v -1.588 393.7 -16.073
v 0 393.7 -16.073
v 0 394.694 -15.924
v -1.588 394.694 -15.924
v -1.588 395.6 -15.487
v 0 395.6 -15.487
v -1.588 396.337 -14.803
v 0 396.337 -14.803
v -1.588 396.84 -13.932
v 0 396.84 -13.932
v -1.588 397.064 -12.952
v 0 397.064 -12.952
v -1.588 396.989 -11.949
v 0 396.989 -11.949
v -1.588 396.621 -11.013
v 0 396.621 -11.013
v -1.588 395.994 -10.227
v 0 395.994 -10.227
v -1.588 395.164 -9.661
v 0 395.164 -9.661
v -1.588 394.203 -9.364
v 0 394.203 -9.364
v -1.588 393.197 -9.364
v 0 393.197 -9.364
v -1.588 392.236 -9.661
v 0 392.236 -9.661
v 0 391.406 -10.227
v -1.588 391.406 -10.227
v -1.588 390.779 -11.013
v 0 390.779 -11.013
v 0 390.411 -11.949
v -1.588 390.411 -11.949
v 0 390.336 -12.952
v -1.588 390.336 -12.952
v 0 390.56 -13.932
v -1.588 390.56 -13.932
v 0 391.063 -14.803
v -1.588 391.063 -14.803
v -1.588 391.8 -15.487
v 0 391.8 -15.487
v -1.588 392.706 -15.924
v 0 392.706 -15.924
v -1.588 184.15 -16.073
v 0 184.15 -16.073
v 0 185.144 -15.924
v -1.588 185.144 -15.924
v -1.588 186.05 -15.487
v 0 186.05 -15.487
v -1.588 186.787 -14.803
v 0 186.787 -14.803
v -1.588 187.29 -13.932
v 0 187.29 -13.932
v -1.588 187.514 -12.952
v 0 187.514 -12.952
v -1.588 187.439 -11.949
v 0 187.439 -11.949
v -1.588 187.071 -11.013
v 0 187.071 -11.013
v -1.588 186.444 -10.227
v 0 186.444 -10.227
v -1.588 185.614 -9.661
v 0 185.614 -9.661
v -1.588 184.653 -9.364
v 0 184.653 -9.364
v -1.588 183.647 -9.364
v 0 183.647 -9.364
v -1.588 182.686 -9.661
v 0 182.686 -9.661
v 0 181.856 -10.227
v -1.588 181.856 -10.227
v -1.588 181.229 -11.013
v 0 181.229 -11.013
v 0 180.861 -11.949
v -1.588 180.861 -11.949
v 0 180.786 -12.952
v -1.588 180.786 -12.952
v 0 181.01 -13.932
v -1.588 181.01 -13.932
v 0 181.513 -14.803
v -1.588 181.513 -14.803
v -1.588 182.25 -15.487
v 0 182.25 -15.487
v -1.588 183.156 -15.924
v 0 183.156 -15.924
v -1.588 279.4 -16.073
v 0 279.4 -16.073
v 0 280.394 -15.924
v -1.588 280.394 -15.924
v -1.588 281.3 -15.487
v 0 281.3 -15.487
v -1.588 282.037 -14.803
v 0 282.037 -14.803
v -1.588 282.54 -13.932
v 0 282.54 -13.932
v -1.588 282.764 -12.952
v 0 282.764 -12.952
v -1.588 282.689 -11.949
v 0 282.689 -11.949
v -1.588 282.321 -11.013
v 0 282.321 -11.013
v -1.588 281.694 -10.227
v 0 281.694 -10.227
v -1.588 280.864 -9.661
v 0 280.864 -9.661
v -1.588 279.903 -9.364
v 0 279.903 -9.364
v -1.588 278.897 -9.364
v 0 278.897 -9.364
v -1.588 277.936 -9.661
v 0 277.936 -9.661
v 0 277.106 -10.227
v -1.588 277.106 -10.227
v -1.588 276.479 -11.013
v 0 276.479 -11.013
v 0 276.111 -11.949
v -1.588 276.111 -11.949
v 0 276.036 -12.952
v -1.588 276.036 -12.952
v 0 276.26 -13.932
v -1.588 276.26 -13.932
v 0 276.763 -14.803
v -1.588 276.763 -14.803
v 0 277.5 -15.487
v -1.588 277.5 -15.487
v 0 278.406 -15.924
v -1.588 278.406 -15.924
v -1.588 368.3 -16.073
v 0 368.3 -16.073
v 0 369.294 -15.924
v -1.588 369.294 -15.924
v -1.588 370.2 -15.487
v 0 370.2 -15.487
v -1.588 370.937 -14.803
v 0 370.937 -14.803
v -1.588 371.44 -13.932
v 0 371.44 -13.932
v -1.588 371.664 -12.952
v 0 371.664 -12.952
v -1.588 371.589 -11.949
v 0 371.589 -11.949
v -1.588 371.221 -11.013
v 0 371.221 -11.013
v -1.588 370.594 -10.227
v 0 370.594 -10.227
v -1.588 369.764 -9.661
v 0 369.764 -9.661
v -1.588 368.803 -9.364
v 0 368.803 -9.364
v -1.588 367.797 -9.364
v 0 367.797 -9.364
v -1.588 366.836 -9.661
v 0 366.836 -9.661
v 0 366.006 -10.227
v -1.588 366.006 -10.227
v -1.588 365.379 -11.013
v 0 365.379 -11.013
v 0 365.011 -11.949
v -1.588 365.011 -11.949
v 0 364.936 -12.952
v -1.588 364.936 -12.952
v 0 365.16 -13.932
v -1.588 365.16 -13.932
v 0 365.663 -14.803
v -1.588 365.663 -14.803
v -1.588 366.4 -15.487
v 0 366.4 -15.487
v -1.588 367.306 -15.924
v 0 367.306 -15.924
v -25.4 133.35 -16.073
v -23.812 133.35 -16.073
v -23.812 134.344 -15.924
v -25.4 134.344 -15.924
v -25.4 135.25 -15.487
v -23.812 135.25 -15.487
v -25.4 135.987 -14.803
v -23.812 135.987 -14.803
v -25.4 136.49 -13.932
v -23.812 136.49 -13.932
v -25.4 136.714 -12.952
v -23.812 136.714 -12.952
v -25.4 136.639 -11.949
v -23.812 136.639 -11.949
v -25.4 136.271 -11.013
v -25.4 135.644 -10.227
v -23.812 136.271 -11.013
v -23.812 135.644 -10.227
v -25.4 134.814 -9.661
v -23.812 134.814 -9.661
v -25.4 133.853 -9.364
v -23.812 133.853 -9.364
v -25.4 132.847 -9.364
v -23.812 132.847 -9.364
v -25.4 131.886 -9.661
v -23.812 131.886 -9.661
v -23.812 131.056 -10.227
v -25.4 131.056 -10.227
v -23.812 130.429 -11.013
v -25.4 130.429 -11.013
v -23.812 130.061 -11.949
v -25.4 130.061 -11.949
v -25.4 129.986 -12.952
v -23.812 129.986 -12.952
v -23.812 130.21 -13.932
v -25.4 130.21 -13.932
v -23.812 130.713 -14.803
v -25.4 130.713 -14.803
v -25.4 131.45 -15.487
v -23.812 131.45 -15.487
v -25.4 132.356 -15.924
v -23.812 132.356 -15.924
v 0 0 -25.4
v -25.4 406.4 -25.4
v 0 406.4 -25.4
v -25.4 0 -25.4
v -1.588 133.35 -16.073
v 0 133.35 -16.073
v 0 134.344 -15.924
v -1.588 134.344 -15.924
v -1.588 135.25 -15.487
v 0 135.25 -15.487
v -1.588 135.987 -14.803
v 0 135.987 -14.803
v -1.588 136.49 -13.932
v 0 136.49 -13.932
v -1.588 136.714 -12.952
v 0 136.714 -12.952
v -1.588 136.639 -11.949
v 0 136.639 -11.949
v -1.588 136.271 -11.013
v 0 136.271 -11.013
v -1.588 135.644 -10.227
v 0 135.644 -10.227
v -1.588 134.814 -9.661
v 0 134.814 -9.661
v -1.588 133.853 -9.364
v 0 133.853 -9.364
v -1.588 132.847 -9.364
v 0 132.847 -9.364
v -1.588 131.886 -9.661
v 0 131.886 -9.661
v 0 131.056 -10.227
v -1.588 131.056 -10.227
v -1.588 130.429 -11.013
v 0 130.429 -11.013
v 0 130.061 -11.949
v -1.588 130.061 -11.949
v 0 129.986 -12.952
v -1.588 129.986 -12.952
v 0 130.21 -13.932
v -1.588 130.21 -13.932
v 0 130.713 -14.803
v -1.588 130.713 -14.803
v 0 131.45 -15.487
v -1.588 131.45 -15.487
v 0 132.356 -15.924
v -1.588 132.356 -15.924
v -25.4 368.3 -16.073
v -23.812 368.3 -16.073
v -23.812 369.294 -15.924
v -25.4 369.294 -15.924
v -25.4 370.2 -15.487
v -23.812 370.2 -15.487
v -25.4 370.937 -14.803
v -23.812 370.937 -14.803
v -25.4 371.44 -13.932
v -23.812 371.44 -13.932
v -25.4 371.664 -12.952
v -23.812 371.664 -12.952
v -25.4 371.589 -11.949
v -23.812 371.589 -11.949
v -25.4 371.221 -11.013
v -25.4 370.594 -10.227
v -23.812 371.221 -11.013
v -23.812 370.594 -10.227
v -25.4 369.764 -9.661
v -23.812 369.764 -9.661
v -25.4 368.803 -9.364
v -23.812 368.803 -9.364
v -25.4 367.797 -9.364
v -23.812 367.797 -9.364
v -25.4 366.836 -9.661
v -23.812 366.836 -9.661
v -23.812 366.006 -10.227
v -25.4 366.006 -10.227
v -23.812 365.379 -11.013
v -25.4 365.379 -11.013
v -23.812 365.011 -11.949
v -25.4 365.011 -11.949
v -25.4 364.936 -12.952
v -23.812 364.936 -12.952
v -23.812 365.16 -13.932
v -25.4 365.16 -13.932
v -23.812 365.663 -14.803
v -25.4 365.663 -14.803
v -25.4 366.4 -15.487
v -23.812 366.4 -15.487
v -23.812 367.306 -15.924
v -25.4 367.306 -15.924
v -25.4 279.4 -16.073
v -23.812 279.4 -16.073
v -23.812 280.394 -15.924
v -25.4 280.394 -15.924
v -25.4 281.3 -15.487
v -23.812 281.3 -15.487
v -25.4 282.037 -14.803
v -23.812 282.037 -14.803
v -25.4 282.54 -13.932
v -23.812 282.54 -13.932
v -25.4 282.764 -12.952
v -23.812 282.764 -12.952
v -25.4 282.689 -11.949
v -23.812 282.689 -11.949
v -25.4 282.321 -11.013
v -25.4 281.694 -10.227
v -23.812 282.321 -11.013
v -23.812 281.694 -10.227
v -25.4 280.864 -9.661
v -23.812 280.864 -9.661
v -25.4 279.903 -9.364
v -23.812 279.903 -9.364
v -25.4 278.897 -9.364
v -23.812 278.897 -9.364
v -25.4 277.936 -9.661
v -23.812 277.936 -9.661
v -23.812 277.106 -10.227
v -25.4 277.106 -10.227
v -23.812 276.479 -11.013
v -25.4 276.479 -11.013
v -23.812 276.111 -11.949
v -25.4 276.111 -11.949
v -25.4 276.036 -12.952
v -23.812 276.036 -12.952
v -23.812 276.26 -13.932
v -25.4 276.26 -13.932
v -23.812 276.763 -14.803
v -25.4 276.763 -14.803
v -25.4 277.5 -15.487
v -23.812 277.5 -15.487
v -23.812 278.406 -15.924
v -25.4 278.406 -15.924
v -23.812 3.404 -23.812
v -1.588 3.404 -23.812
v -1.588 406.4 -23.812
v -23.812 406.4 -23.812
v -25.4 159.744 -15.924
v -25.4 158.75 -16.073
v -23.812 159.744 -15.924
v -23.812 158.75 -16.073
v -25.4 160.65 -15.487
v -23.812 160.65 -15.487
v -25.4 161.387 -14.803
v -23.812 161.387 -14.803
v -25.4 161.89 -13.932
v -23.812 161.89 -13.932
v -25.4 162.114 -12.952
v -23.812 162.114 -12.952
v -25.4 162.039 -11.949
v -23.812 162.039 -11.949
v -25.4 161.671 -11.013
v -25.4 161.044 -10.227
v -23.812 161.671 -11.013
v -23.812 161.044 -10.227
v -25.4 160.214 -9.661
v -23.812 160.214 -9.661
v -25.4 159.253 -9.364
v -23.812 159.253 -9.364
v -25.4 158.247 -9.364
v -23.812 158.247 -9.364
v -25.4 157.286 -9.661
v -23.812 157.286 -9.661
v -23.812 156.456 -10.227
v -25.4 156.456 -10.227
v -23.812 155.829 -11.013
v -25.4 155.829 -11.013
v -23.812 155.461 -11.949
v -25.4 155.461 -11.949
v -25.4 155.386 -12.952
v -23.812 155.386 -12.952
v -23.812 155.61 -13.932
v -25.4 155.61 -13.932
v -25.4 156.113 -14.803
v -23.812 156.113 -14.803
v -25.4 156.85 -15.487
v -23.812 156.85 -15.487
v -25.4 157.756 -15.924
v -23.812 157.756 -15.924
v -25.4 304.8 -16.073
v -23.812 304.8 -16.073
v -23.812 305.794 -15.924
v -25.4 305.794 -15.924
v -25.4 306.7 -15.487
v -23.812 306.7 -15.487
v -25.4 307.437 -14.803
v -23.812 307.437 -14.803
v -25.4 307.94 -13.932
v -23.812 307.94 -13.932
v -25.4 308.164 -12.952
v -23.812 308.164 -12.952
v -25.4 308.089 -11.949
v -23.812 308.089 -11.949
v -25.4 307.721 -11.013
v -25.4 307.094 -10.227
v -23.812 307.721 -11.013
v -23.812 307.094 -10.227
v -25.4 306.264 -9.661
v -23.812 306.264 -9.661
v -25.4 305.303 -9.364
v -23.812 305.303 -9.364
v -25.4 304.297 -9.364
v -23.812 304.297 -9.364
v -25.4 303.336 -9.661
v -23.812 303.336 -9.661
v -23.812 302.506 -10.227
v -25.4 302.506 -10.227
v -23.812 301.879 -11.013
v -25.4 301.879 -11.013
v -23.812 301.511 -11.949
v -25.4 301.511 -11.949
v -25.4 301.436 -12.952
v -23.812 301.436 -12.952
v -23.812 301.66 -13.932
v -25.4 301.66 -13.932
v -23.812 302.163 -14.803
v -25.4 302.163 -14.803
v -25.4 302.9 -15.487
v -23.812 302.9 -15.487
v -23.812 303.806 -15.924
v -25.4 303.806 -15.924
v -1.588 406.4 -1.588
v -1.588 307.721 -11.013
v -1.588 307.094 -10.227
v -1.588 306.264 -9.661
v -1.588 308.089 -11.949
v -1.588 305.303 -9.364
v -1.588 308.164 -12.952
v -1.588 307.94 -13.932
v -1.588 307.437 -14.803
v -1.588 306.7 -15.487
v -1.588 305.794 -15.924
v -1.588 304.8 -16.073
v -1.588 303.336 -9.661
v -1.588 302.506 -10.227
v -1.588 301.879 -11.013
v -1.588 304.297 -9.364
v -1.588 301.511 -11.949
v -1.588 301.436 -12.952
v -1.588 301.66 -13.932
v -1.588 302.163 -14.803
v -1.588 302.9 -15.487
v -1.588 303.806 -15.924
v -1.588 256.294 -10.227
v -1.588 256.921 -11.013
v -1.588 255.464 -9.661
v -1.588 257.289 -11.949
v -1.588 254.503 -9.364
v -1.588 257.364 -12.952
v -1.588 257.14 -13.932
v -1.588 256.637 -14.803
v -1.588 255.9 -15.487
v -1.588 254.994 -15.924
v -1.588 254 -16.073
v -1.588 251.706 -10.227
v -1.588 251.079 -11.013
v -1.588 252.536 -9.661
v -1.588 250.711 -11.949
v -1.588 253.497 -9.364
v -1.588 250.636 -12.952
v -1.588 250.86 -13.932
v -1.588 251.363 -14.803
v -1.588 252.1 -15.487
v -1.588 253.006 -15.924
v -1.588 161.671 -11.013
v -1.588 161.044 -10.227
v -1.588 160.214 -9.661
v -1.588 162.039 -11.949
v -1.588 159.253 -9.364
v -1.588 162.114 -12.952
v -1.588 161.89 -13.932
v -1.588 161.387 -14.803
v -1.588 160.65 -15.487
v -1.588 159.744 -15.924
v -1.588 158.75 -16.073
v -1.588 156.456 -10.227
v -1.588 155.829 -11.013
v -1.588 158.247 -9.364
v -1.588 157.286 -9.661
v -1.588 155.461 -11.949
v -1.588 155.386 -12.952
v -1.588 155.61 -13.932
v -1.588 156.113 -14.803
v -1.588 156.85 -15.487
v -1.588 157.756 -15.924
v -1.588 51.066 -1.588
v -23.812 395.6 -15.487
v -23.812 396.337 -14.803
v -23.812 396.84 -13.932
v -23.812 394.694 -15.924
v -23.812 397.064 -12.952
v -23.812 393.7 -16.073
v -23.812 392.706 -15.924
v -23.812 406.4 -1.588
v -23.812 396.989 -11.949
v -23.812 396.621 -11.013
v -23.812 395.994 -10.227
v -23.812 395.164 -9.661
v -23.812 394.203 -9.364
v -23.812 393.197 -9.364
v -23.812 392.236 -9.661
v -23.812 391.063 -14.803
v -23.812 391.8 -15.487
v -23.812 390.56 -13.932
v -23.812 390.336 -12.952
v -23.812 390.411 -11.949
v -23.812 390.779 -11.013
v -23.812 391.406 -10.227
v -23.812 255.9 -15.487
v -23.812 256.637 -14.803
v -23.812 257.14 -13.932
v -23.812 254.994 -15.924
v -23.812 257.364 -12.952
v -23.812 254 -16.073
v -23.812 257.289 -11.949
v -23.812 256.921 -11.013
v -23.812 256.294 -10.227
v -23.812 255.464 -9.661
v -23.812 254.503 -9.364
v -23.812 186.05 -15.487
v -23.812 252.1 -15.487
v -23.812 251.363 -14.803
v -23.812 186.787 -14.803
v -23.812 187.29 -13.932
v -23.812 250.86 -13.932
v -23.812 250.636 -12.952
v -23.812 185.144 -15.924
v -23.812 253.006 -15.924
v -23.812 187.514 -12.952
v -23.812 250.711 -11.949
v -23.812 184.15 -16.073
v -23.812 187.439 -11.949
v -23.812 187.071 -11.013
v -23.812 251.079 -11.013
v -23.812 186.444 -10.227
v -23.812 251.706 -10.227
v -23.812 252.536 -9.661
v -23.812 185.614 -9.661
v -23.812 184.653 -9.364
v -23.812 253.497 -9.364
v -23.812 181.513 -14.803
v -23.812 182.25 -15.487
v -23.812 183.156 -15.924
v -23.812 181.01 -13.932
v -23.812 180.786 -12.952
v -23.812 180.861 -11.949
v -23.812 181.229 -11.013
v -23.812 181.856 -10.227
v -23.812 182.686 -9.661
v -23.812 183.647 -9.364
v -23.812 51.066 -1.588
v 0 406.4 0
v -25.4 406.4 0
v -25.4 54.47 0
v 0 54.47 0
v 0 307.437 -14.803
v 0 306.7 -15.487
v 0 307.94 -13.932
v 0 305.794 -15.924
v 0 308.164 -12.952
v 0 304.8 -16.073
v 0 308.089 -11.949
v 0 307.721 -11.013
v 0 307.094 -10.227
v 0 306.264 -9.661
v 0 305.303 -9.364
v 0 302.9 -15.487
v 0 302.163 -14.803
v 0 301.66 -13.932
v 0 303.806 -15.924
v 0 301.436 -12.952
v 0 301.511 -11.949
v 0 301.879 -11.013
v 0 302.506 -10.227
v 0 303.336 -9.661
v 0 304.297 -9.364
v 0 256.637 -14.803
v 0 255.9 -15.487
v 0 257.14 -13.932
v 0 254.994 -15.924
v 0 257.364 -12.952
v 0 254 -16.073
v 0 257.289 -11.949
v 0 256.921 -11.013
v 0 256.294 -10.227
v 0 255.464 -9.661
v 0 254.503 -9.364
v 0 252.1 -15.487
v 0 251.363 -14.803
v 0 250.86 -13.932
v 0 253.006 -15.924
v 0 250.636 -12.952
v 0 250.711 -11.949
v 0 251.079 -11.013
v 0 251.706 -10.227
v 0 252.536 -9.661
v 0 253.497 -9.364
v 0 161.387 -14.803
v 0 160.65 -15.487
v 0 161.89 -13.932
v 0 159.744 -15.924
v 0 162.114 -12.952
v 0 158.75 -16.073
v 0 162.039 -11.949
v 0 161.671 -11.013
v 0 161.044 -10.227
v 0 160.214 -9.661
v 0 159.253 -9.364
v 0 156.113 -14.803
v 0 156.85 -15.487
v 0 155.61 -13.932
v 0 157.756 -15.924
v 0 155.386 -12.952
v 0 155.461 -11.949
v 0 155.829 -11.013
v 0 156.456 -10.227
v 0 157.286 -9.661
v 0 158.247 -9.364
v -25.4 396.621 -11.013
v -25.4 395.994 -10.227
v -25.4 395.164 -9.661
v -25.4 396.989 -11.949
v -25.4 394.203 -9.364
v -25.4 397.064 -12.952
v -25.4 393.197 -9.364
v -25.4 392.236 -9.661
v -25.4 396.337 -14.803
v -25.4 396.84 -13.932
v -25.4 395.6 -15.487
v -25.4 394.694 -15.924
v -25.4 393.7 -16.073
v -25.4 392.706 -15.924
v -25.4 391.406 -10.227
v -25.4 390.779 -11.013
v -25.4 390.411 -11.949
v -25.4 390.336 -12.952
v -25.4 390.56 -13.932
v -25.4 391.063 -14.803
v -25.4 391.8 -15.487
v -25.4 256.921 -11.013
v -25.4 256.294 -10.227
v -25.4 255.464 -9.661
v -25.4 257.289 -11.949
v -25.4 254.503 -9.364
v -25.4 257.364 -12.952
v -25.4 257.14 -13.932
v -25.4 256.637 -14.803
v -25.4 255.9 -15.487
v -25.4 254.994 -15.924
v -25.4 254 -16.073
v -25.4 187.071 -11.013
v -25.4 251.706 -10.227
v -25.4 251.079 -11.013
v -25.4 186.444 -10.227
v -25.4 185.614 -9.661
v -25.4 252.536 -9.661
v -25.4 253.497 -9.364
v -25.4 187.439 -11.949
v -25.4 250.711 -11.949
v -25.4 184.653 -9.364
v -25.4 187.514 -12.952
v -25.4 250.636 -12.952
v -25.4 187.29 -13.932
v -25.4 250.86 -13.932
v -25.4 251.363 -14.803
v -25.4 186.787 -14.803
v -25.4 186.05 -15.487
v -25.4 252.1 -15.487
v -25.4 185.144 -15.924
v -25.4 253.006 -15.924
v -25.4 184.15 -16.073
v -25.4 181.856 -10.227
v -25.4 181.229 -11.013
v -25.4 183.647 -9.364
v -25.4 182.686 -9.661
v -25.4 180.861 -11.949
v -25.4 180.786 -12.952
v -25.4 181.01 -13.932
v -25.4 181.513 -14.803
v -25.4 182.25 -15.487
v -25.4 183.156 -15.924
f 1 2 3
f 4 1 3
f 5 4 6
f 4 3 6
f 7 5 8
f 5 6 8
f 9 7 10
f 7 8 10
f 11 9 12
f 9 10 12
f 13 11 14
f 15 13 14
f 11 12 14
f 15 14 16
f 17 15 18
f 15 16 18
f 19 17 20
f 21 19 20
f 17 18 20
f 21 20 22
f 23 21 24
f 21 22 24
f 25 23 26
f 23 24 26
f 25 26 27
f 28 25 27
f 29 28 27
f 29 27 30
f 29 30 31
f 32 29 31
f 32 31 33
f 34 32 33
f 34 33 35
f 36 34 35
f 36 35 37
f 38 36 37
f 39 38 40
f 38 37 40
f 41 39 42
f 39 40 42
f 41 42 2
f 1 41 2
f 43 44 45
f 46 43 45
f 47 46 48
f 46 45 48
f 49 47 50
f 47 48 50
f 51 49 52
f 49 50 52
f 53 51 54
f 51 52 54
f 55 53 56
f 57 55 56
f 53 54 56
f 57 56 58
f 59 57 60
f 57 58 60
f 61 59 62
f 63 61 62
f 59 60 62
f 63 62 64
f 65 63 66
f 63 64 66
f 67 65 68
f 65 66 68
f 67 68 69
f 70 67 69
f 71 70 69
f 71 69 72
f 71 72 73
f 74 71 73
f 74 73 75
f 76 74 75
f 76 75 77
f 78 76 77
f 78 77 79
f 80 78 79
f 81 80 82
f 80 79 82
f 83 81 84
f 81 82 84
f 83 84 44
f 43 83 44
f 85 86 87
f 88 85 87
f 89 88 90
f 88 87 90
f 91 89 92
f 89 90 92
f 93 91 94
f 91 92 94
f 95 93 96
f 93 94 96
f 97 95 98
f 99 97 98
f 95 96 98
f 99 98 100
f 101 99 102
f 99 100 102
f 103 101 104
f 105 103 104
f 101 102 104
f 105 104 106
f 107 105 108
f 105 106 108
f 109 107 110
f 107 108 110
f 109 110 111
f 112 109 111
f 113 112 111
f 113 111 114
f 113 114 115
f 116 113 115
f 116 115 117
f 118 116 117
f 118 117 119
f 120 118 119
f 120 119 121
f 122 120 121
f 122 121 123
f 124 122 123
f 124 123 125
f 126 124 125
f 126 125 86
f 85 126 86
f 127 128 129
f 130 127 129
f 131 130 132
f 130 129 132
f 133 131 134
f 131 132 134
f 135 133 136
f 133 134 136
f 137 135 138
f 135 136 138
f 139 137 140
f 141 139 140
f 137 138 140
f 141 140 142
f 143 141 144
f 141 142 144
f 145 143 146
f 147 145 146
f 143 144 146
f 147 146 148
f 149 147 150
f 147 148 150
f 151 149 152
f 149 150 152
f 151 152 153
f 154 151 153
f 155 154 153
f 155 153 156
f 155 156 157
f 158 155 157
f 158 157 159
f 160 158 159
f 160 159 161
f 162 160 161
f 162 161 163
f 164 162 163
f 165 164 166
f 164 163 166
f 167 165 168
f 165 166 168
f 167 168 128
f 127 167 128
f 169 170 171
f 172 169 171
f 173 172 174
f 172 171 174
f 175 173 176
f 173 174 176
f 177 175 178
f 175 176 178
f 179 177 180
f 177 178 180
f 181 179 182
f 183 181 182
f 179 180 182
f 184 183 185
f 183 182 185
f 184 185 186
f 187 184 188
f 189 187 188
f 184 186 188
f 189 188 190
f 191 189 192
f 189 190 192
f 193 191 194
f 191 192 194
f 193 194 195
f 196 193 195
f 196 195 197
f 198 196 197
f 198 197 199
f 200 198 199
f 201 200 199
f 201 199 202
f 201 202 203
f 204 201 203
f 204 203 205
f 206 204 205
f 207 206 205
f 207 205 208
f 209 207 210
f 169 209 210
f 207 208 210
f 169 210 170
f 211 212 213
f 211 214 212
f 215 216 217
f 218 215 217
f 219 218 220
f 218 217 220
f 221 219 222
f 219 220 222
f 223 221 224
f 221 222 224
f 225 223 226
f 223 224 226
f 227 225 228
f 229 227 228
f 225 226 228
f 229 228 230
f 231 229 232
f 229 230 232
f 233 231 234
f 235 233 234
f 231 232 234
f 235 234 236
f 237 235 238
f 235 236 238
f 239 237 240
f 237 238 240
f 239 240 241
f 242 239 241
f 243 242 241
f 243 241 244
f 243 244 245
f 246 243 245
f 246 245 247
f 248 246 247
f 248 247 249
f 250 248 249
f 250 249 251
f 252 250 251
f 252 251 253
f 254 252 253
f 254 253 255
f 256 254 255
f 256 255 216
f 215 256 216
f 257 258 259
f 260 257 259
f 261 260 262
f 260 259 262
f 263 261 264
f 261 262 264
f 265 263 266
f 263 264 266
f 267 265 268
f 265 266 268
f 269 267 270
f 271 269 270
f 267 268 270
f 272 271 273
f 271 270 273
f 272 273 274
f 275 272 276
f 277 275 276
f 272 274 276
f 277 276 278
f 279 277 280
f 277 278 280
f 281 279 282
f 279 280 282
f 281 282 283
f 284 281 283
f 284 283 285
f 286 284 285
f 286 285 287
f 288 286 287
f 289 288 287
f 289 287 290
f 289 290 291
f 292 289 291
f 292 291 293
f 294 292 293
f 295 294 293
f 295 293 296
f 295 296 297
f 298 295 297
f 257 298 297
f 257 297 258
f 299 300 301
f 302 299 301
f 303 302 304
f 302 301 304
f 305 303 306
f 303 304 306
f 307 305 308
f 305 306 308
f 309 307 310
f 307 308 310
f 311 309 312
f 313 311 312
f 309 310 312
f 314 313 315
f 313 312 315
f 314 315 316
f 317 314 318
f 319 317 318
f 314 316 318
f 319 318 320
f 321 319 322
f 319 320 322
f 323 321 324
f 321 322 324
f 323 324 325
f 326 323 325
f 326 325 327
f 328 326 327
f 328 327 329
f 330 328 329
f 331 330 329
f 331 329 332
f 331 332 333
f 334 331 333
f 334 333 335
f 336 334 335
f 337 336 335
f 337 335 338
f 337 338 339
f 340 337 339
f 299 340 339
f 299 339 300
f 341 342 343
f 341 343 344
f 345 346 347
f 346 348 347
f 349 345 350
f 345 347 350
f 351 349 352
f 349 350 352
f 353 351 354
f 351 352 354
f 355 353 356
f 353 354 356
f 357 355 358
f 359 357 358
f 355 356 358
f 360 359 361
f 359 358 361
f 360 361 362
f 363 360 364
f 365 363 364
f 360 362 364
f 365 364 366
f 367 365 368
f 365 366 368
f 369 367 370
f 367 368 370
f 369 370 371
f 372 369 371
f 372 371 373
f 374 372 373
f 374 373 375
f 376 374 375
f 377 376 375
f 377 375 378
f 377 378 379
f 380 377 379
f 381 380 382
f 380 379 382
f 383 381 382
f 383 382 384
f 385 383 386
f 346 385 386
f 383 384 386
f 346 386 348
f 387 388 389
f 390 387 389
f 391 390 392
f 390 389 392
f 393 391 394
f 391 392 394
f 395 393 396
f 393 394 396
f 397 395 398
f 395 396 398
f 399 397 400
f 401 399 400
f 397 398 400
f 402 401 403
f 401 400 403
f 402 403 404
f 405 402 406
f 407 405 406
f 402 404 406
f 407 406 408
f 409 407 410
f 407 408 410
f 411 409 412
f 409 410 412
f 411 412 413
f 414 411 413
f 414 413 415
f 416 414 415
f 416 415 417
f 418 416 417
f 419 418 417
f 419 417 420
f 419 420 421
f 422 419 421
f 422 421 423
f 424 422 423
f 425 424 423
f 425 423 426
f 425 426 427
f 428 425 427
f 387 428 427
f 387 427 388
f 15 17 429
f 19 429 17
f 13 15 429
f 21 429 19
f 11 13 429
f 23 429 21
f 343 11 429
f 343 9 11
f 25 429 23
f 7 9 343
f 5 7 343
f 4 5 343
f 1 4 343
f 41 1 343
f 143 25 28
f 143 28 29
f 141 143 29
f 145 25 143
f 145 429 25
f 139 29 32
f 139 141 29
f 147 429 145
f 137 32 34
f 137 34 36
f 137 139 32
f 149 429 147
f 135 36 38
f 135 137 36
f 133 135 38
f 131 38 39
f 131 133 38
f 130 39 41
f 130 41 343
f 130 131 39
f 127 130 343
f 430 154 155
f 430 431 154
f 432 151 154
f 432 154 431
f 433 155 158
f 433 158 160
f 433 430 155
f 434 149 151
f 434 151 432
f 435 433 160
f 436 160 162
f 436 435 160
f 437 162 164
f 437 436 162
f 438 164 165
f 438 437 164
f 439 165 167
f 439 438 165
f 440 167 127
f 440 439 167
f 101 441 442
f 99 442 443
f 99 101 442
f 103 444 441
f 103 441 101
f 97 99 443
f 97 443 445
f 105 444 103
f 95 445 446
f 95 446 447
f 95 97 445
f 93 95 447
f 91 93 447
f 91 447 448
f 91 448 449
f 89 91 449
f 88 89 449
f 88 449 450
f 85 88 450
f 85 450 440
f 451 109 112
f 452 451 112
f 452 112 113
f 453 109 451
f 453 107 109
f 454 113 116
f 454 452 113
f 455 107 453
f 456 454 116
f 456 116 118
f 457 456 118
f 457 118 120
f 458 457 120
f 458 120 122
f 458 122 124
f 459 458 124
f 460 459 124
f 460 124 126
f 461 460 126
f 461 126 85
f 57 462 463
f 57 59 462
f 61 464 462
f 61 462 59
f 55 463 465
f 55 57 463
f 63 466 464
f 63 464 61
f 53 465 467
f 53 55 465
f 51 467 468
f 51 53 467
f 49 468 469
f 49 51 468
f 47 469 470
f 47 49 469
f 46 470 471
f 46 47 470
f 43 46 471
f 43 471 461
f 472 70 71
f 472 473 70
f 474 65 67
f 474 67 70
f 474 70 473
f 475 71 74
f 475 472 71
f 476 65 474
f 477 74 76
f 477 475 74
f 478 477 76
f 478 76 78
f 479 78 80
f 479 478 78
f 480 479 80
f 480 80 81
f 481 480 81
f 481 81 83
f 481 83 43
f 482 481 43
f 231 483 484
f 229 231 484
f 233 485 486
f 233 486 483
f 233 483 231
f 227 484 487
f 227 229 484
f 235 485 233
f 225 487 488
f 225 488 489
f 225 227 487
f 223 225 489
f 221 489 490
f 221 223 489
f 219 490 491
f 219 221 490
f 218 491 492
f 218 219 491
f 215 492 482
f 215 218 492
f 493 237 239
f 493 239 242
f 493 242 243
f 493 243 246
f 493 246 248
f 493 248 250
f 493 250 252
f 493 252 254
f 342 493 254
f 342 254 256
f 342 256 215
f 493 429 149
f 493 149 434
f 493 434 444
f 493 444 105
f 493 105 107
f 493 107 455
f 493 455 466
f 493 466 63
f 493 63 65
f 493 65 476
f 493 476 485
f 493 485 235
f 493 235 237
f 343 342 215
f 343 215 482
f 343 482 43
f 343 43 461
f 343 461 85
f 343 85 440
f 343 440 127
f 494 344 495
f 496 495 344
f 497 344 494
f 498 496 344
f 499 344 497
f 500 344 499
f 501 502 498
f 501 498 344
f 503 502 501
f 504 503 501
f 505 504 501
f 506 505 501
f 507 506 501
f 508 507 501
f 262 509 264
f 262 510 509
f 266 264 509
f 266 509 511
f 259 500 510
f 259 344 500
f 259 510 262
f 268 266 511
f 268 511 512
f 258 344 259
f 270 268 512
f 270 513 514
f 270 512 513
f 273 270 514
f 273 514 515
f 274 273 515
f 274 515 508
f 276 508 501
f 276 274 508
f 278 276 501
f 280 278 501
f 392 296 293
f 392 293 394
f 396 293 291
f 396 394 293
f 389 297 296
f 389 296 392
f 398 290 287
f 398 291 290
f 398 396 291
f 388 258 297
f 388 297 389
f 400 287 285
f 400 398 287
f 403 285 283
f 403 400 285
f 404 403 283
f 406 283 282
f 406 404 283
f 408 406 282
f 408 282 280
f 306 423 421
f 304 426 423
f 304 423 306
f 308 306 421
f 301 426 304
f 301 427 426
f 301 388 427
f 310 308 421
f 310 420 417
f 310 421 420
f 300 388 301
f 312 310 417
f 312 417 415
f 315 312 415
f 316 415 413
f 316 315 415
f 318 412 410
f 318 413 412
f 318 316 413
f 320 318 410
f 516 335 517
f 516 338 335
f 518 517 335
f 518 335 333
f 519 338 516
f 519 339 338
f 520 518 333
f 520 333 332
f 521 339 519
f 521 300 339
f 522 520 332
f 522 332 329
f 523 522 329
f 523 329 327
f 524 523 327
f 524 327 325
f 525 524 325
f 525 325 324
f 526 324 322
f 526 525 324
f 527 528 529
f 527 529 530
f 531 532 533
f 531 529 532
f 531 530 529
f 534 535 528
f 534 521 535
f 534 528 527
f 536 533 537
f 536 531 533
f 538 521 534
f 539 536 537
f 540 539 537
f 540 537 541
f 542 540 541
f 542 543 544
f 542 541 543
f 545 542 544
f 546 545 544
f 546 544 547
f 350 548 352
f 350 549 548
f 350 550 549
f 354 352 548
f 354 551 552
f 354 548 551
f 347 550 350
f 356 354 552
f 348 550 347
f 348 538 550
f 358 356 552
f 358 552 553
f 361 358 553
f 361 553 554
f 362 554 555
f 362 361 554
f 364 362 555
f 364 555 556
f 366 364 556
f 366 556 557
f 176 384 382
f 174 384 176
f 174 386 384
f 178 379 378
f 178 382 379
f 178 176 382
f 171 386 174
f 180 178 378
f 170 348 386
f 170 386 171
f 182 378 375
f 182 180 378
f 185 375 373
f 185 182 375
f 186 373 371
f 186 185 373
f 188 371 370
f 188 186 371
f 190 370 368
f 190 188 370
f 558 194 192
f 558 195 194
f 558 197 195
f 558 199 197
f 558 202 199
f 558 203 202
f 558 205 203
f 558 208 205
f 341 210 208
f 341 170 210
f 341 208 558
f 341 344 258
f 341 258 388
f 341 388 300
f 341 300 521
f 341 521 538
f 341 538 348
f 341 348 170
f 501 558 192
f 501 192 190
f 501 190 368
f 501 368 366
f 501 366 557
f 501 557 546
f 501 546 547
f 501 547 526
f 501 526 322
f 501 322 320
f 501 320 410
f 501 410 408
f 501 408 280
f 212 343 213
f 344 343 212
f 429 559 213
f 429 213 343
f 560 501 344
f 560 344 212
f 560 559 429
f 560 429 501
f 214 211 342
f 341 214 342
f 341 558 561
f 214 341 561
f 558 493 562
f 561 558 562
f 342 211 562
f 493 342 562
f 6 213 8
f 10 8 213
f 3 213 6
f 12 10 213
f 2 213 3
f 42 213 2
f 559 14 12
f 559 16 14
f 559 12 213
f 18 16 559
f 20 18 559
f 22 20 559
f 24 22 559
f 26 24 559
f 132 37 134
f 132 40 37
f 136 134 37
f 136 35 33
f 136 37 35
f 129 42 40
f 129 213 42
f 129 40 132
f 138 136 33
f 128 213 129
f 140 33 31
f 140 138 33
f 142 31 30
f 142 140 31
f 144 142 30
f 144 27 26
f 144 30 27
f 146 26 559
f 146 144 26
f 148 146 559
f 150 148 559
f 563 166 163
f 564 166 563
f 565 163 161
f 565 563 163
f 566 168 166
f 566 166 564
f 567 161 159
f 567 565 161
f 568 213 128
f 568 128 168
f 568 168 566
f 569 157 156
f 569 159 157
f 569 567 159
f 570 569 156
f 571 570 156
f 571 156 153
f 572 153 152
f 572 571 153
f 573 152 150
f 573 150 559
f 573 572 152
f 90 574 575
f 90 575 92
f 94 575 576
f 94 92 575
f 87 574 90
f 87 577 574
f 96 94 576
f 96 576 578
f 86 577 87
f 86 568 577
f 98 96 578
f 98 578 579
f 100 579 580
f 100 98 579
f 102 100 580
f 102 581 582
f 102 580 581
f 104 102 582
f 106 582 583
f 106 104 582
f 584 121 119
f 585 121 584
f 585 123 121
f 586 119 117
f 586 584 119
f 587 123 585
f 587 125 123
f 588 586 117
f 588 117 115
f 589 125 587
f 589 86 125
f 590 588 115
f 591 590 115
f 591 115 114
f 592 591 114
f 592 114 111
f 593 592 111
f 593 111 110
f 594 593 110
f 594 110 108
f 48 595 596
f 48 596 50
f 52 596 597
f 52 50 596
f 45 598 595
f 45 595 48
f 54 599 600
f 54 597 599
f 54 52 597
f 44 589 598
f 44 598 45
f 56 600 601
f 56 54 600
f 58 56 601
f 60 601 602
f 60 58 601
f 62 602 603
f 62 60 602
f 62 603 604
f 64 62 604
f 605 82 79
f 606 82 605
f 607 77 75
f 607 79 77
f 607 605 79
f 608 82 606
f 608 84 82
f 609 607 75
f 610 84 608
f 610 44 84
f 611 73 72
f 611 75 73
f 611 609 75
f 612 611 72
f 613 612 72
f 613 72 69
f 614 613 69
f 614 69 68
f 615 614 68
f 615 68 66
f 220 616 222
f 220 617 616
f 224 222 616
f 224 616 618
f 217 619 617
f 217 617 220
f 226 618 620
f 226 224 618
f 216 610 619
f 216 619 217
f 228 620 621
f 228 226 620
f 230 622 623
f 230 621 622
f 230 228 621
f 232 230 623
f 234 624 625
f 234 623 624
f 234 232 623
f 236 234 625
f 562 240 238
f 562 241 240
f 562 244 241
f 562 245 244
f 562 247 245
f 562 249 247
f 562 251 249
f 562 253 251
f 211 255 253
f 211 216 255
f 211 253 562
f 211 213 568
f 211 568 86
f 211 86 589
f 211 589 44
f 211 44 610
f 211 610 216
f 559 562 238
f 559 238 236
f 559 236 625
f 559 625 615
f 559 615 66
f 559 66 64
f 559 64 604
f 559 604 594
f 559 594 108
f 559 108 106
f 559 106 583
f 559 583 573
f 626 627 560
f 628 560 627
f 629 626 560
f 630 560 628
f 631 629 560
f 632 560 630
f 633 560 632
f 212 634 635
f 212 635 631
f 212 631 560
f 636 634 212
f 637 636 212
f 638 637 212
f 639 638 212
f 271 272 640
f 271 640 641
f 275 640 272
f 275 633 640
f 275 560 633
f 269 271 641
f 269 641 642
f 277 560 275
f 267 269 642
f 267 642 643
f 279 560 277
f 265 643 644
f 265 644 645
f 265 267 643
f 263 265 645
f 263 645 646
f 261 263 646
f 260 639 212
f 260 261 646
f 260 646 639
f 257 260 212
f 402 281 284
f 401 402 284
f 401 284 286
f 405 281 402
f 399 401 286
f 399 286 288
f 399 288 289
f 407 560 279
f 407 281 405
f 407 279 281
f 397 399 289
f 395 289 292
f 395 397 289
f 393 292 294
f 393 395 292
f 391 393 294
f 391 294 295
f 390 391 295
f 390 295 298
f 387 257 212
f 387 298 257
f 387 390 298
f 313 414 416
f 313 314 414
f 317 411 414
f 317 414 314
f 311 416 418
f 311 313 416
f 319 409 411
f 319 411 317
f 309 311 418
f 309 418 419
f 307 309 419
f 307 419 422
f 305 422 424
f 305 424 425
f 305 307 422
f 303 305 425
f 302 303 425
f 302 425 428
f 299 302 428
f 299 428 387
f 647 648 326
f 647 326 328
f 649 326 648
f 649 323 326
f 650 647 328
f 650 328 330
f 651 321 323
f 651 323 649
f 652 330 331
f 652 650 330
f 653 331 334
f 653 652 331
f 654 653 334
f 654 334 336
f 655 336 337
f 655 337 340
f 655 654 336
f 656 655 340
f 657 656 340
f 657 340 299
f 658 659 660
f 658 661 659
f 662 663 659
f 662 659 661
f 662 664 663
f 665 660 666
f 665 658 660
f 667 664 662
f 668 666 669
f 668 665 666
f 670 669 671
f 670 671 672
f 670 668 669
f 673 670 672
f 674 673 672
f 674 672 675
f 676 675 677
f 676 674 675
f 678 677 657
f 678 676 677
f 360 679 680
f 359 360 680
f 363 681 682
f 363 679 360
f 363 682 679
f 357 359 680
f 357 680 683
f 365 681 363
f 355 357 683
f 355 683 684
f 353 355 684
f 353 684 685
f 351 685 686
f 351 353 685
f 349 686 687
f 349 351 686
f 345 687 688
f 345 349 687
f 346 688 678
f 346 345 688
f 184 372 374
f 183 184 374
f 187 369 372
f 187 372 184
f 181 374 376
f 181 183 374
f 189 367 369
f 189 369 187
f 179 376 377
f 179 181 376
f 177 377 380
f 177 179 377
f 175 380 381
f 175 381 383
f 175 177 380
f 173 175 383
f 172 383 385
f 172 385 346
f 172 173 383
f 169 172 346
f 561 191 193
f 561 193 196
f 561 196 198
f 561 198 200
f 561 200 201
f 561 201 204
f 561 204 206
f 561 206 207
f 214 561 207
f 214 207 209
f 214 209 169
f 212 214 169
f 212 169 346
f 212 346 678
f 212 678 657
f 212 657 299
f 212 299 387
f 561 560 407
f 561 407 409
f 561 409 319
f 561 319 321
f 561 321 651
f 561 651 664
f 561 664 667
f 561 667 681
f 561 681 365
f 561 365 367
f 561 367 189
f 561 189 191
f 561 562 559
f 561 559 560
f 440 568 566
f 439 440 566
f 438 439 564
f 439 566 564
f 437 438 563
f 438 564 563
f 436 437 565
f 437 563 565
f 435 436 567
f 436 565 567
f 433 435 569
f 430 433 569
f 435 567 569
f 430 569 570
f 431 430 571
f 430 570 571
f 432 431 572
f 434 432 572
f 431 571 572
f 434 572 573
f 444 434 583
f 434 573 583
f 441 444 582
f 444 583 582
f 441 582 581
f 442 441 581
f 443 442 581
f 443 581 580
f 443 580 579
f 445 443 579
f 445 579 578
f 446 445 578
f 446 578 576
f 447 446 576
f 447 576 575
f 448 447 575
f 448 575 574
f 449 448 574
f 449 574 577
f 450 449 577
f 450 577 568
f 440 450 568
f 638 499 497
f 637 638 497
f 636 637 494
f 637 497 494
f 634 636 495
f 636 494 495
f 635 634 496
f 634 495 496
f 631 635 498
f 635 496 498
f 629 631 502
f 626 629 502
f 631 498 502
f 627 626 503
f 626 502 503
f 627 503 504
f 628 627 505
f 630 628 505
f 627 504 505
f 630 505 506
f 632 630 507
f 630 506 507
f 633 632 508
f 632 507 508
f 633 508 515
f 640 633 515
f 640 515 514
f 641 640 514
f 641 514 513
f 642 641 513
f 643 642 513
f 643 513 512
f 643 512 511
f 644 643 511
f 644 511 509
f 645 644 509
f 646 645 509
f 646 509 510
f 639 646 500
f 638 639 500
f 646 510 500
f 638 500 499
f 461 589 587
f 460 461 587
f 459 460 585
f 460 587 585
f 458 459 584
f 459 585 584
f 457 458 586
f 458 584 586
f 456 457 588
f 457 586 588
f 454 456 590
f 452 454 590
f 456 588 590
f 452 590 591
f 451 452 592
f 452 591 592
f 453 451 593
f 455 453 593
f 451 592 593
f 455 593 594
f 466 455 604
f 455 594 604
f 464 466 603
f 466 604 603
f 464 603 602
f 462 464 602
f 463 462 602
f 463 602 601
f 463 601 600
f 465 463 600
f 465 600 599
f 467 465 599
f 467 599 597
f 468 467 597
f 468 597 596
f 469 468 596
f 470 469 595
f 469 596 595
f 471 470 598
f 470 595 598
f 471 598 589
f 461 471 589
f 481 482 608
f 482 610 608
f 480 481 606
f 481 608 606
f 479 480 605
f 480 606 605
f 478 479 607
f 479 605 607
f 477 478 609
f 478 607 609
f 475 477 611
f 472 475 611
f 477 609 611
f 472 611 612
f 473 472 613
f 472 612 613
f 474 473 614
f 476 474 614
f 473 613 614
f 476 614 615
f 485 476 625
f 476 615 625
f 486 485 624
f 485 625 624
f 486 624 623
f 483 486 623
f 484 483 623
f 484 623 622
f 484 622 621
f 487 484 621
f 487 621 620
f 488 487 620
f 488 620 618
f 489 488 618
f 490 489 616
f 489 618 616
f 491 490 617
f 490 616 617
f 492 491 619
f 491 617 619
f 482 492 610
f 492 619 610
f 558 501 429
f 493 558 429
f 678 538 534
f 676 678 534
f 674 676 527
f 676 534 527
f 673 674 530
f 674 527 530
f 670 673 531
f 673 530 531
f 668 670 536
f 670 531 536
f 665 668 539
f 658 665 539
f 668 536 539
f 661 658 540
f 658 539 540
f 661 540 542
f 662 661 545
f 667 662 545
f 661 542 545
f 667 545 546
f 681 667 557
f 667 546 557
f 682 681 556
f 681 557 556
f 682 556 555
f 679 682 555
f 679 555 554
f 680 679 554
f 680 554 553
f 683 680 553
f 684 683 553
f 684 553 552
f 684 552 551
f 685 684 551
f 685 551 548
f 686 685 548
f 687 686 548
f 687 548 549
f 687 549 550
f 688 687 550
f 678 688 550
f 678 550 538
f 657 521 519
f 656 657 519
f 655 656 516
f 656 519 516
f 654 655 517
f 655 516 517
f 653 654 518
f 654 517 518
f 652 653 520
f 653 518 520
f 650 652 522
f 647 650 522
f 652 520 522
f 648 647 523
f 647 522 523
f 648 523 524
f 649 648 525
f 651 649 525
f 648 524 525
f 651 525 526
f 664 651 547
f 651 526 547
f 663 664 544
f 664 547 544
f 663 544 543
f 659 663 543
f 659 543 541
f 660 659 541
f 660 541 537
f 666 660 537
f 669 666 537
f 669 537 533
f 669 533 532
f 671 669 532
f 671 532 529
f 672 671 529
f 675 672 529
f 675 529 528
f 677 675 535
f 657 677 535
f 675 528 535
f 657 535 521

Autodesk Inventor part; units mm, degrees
ref_plane "YZ Plane" through (0, 0, 0) normal (1, 0, 0) x (0, 1, 0)
ref_plane "XZ Plane" through (0, 0, 0) normal (0, 1, 0) x (-1, 0, 0)
ref_plane "XY Plane" through (0, 0, 0) normal (0, 0, 1) x (1, 0, 0)
sketch "Sketch1" plane through (0, 0, 0) normal (0, 1, 0) x (-1, 0, 0)
  line L0 (0, 0) -> (25.4, 0)
  line L1 (25.4, 0) -> (25.4, -25.4)
  line L2 (25.4, -25.4) -> (0, -25.4)
  line L3 (0, -25.4) -> (0, 0)
  line L4 (1.5875, -23.8125) -> (23.8125, -23.8125)
  line L5 (23.8125, -23.8125) -> (23.8125, -1.5875)
  line L6 (23.8125, -1.5875) -> (1.5875, -1.5875)
  line L7 (1.5875, -1.5875) -> (1.5875, -23.8125)
  dimension "d0" = 25.4
  dimension "d1" = 25.4
  dimension "d2" = 1.5875
extrude "Extrusion1" add sketch "Sketch1" along normal blind 406.4
sketch "Sketch2" plane through (0, 0, 0) normal (1, 0, 0) x (0, 0, -1)
  line L0 (25.4, 0) -> (25.4, 406.4) projected
  line L1 (25.4, 0) -> (0, 54.4705)
  line L2 (0, 0) -> (0, 406.4) projected
  line L3 (0, 54.4705) -> (0, 0)
  line L4 (0, 0) -> (25.4, 0)
  dimension "d5" = 25
extrude "Extrusion2" cut sketch "Sketch2" against normal blind 25.4
sketch "Sketch3" plane through (0, 406.4, 0) normal (1, 0, 0) x (0, 0, -1)
  circle A0 centre (12.7, -12.7) radius 3.3734
  line L0 (0, 0) -> (25.4, 0) projected
  line L1 (0, -351.9295) -> (0, 0) projected
  circle A1 centre (12.7, -38.1) radius 3.3734
  point P0 (0, -406.4)
  dimension "d8" = 6.7469
  dimension "d9" = 12.7
  dimension "d10" = 12.7
  dimension "d11" = 6.7469
  dimension "d12" = 12.7
  dimension "d13" = 38.1
extrude "Extrusion3" cut sketch "Sketch3" against normal blind 25.4
sketch "Sketch4" plane through (0, 406.4, 0) normal (1, 0, 0) x (0, 0, -1)
  circle A0 centre (12.7, -152.4) radius 3.3734
  line L0 (0, 0) -> (25.4, 0) projected
  circle A1 centre (12.7, -127) radius 3.3734
  circle A2 centre (12.7, -101.6) radius 3.3734
  line L1 (0, -351.9295) -> (0, 0) projected
  circle A3 centre (12.7, -247.65) radius 3.3734
  circle A4 centre (12.7, -222.25) radius 3.3734
  circle A5 centre (12.7, -273.05) radius 3.3734
  line L2 (12.7, -273.05) -> (12.7, -222.25) construction
  line L3 (25.4, -406.4) -> (25.4, 0) construction
  point P0 (0, -406.4)
  dimension "d16" = 6.7469
  dimension "d17" = 152.4
  dimension "d18" = 6.7469
  dimension "d19" = 25.4
  dimension "d20" = 6.7469
  dimension "d21" = 12.7
  dimension "d22" = 12.7
  dimension "d23" = 12.7
  dimension "d24" = 25.4
  dimension "d25" = 6.7469
  dimension "d26" = 25.4
  dimension "d27" = 25.4
  dimension "d28" = 12.7
  dimension "d30" = 273.05
extrude "Extrusion4" cut sketch "Sketch4" against normal blind 25.4
sketch "Sketch5" plane through (-25.4, 406.4, -25.4) normal (-1, 0, 0) x (0, 0, 1)
  line L0 (25.4, -351.9295) -> (25.4, 0) projected
  line L1 (0, -406.4) -> (0, 0) projected
  point P0 (25.4, -406.4)
  point P1 (0, -351.9295)
properties part number "top" material "Aluminum 6061"
